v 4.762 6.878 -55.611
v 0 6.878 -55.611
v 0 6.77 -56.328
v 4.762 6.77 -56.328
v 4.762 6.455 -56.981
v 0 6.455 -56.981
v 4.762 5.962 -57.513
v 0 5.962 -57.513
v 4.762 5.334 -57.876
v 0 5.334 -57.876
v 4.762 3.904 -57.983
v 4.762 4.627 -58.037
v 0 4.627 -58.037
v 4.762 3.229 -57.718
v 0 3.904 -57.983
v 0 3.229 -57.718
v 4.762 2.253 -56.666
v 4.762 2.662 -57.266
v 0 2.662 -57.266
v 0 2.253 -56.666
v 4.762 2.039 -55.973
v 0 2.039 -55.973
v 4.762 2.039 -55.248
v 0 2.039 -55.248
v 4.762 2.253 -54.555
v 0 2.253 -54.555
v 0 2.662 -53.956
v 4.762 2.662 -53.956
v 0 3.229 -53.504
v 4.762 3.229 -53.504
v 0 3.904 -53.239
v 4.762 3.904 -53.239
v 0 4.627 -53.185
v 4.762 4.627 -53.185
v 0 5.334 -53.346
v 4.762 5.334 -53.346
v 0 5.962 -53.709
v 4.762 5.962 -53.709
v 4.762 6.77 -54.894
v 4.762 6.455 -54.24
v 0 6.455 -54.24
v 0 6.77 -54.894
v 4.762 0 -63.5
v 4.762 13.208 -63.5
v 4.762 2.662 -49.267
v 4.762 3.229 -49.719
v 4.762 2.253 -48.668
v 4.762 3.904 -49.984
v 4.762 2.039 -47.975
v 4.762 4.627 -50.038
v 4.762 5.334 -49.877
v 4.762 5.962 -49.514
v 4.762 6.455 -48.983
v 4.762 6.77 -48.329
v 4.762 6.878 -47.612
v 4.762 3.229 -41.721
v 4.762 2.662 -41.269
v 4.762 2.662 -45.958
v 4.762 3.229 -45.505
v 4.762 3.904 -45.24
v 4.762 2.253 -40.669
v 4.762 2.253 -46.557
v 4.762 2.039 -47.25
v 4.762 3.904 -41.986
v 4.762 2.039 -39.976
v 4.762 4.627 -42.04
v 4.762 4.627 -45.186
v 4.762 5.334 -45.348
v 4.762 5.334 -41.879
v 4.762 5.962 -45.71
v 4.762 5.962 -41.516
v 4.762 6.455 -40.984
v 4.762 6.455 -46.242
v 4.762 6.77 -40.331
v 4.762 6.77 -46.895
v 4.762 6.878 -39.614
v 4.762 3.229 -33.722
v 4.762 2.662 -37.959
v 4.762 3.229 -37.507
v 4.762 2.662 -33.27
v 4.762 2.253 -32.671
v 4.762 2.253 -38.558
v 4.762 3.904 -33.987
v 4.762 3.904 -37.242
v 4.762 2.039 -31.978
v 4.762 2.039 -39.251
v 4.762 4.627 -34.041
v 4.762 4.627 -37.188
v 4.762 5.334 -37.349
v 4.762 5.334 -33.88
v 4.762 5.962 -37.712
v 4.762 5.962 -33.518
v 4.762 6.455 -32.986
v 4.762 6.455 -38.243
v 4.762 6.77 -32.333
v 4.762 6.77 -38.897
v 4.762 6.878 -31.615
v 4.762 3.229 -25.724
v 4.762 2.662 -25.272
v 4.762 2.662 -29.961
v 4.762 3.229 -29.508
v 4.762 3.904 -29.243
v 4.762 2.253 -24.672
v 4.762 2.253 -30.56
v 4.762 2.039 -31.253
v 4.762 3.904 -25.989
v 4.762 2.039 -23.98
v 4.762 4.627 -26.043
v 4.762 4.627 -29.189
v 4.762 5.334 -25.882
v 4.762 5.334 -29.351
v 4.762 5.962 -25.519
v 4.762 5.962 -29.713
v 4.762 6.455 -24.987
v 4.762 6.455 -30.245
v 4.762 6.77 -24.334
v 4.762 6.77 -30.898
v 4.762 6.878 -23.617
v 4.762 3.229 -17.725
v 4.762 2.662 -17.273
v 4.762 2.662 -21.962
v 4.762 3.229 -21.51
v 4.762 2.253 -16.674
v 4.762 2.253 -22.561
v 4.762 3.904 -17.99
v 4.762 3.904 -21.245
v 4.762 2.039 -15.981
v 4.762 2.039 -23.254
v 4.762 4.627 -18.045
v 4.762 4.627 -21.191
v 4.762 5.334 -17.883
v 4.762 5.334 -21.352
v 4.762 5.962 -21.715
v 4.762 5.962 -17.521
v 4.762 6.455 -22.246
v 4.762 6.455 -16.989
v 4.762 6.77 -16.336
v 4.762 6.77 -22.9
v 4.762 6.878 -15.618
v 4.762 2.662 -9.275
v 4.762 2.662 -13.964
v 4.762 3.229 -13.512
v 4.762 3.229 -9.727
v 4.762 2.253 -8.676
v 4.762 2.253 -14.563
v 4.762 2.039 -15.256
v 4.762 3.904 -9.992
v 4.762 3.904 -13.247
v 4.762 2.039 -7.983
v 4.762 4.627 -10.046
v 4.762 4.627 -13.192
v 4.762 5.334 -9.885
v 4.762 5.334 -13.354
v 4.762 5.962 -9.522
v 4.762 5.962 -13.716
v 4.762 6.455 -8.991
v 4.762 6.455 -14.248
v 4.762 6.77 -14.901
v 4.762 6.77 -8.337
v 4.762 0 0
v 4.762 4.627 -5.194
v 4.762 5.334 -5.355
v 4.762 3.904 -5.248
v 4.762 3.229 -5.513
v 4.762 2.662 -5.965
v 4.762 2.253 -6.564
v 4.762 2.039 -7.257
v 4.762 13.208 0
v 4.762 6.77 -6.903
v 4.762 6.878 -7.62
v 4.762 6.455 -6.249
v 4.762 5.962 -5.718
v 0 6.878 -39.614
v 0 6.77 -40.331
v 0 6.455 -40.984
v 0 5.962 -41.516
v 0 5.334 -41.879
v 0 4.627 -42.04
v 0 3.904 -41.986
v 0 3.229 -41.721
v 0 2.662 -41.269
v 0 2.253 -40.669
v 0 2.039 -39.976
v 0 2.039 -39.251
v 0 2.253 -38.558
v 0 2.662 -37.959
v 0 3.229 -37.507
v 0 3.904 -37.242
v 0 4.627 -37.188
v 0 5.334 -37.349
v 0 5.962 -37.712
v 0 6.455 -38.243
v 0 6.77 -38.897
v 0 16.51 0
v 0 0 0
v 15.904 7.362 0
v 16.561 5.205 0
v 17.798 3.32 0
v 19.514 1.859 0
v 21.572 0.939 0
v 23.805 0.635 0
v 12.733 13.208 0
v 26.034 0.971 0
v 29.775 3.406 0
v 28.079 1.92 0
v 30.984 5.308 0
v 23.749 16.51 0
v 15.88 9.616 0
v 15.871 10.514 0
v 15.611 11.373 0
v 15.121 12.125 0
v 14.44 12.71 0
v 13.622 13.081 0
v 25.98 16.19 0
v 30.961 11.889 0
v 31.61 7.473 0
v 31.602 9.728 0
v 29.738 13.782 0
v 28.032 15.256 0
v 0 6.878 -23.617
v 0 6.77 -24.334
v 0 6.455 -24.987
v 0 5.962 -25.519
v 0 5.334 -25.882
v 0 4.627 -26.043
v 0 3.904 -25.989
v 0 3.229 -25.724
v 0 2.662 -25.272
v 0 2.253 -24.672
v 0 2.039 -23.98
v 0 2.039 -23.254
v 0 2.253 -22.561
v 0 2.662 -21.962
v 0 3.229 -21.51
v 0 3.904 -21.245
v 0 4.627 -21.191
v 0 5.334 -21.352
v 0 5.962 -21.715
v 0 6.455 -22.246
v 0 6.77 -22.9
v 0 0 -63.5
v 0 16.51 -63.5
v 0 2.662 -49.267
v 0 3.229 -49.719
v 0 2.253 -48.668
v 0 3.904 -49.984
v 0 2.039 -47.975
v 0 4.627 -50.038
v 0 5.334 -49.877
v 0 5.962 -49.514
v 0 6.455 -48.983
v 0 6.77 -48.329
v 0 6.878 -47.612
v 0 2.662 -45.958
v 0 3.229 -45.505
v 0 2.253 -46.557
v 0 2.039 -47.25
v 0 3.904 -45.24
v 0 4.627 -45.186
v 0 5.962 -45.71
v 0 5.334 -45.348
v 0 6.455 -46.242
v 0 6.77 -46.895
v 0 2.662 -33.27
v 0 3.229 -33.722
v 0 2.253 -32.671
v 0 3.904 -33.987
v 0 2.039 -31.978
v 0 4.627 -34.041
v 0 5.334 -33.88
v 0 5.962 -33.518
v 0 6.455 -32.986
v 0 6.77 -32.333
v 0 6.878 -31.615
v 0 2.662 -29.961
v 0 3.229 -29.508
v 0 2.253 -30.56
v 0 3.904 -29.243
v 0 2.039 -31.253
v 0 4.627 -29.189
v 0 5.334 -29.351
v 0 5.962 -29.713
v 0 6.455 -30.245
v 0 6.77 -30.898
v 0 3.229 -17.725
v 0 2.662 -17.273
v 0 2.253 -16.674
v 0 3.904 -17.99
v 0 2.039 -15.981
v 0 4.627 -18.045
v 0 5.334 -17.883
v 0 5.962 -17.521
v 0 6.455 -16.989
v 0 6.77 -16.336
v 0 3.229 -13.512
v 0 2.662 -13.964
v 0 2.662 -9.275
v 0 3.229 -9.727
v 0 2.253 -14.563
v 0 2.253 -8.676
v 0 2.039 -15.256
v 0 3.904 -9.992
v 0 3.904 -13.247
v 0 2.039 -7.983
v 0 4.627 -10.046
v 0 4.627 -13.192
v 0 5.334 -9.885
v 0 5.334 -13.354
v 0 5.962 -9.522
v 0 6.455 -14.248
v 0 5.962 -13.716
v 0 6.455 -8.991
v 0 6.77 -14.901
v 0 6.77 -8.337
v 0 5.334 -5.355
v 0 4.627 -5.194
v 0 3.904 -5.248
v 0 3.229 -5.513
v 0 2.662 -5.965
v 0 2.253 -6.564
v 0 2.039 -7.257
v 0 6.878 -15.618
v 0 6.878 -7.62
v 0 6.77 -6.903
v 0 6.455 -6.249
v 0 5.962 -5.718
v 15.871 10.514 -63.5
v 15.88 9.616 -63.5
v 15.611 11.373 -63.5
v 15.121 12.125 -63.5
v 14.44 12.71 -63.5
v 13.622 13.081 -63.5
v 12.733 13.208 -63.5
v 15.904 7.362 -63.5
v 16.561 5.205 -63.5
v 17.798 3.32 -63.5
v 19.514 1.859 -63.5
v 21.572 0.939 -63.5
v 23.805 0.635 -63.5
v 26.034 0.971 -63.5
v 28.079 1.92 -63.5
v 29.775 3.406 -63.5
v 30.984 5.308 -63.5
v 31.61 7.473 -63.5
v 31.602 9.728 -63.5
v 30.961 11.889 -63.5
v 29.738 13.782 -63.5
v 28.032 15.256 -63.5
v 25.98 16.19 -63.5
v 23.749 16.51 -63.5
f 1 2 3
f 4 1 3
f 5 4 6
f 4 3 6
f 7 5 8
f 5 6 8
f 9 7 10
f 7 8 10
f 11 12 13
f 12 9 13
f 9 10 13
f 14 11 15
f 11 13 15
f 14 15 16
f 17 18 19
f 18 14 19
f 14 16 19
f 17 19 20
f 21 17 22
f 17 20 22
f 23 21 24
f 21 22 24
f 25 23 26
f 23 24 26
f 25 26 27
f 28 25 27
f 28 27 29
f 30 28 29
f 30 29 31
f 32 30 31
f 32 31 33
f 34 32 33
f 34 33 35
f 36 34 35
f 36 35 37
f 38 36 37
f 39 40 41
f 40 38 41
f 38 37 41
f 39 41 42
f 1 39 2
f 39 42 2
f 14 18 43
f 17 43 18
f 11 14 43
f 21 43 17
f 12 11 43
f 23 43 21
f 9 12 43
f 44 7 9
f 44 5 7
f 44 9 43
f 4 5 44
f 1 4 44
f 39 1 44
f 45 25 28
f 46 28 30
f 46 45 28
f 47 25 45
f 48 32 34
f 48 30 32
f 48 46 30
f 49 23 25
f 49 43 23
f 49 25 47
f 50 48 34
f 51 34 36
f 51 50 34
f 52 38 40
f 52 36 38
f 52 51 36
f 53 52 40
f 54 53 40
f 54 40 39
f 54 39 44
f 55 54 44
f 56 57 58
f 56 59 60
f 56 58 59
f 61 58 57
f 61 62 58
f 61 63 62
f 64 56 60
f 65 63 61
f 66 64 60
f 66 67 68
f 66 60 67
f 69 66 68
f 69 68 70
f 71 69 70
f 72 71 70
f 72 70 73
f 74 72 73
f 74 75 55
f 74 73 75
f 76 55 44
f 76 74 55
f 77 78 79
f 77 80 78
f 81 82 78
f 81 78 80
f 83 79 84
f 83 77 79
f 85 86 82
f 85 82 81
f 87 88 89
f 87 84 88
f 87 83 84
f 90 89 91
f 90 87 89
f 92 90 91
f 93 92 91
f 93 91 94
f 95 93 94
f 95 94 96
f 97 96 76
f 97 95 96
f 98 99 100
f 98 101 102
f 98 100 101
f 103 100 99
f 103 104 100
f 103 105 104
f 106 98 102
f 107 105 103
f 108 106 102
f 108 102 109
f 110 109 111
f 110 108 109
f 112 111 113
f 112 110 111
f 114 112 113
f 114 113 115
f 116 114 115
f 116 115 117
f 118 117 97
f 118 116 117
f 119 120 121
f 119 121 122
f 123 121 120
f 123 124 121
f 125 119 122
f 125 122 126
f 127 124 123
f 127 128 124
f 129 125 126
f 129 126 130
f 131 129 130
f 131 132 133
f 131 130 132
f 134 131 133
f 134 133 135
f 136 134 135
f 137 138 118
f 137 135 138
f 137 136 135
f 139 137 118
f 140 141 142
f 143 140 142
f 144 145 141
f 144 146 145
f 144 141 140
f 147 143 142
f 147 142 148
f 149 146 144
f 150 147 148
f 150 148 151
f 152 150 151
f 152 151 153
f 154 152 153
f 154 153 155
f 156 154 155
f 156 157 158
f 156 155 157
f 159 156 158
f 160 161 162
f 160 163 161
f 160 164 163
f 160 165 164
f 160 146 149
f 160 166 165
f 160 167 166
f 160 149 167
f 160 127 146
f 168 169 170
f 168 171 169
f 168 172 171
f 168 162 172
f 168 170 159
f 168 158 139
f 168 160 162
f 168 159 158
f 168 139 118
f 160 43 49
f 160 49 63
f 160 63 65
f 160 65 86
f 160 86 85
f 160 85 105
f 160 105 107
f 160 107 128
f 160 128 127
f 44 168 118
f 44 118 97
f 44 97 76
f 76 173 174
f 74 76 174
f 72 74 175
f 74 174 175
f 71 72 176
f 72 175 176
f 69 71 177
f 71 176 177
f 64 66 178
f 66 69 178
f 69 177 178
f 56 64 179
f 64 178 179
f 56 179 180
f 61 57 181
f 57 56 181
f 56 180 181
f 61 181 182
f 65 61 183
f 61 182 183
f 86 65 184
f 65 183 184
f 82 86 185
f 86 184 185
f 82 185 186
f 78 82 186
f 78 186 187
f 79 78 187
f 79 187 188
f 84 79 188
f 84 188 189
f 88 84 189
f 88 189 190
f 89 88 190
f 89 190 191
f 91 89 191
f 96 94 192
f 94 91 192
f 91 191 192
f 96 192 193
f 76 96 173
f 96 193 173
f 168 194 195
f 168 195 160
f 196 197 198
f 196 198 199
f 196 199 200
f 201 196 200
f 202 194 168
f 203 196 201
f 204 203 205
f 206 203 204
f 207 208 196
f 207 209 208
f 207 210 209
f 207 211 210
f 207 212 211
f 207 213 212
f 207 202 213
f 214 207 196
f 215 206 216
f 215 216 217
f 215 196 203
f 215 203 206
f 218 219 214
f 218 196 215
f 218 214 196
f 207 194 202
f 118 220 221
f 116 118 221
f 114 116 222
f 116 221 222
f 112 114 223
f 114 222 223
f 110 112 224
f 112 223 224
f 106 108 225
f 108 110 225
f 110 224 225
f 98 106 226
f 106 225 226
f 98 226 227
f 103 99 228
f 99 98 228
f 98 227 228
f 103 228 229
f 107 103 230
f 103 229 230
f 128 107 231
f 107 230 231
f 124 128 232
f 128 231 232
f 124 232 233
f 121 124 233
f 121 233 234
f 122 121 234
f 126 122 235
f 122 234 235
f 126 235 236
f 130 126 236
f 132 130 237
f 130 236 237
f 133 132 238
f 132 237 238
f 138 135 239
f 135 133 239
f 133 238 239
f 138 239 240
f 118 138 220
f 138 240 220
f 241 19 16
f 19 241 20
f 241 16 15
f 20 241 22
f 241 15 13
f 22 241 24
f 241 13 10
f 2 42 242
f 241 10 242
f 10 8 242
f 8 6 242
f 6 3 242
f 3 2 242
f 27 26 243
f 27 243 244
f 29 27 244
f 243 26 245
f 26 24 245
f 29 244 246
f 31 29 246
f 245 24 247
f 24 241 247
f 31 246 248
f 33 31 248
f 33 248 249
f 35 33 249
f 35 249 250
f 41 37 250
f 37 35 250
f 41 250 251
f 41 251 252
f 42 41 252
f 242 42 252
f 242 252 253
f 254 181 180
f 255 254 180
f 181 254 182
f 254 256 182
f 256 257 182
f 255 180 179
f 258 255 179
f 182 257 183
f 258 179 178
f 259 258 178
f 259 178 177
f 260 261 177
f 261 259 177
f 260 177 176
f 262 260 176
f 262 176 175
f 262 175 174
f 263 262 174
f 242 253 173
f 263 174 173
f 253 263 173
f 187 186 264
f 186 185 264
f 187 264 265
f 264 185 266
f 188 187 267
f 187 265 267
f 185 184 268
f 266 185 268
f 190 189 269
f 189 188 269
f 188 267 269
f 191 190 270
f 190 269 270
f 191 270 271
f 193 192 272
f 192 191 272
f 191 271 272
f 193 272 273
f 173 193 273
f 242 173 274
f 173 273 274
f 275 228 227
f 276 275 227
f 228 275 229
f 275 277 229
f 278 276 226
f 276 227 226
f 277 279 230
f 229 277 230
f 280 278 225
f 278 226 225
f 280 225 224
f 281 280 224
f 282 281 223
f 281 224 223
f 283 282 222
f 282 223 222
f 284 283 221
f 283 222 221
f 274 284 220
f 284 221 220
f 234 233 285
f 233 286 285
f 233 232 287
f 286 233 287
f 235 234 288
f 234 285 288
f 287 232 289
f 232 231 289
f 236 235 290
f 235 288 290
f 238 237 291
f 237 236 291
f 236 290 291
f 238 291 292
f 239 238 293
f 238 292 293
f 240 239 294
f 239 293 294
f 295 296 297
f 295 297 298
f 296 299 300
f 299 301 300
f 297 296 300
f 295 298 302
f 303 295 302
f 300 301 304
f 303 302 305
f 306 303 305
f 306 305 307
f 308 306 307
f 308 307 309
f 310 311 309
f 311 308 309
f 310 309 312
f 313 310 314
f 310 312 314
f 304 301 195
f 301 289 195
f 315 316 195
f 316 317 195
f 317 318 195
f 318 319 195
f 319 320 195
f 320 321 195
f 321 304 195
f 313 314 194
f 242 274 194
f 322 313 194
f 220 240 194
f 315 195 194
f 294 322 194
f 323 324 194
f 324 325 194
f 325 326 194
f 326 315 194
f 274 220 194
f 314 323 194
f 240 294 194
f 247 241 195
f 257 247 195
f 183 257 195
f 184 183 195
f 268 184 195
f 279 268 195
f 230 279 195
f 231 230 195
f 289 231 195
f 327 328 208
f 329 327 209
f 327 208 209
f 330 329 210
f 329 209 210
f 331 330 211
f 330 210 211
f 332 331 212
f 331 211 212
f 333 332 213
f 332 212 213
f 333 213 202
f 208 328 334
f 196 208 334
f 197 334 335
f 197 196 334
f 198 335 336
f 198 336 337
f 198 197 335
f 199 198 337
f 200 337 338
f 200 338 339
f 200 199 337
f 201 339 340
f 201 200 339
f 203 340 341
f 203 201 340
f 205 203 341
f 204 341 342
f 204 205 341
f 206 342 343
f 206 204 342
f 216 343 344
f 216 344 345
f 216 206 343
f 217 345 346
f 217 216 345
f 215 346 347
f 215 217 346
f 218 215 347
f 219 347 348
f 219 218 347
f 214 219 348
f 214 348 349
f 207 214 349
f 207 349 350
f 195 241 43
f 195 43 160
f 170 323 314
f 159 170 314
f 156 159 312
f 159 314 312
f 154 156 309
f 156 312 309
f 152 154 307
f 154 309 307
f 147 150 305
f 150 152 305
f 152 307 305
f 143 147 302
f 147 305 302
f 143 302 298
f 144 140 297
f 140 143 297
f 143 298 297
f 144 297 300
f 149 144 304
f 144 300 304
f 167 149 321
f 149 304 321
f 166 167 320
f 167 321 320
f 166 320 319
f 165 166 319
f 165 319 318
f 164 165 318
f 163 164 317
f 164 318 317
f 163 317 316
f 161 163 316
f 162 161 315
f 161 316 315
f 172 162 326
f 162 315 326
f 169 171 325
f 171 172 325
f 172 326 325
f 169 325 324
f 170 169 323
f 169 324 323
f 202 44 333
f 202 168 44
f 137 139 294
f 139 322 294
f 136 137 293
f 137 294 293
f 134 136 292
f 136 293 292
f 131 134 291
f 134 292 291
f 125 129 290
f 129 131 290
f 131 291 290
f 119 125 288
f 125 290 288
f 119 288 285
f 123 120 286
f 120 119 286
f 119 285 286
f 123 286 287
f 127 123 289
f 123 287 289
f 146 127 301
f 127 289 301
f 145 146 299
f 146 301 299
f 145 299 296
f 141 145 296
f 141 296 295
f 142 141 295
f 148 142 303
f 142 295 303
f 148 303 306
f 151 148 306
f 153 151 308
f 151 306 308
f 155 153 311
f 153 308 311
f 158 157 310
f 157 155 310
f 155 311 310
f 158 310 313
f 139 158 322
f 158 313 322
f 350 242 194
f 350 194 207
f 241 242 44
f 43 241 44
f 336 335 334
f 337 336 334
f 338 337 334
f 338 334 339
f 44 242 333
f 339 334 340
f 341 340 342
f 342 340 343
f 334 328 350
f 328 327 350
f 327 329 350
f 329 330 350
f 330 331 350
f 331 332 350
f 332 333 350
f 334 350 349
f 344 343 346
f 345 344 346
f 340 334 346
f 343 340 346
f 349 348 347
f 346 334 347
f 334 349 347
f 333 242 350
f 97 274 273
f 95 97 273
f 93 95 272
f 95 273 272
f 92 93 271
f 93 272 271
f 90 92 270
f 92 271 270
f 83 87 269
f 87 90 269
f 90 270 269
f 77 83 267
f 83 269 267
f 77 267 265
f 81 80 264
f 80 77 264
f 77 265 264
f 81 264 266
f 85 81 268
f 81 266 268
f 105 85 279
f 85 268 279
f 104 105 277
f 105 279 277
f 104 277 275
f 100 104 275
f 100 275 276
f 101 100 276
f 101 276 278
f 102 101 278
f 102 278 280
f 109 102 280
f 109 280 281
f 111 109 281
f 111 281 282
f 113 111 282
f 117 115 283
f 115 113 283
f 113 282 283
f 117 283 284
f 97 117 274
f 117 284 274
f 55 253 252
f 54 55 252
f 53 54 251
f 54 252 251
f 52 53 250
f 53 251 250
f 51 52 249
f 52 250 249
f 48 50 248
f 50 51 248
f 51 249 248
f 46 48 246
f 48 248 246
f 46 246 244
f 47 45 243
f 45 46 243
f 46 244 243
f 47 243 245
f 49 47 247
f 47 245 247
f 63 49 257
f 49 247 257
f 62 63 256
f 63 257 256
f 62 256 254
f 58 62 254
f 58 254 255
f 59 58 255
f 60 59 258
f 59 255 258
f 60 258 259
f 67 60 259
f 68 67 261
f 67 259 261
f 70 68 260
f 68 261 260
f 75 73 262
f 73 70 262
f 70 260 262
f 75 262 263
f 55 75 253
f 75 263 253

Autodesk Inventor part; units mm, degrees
ref_plane "YZ Plane" through (0, 0, 0) normal (1, 0, 0) x (0, 1, 0)
ref_plane "XZ Plane" through (0, 0, 0) normal (0, 1, 0) x (-1, 0, 0)
ref_plane "XY Plane" through (0, 0, 0) normal (0, 0, 1) x (1, 0, 0)
sketch "Sketch1" plane through (0, 0, 0) normal (1, 0, 0) x (0, 1, 0)
  line L0 (0, 0) -> (16.51, 0)
  line L1 (16.51, 0) -> (16.51, -63.5)
  line L2 (16.51, -63.5) -> (0, -63.5)
  line L3 (0, -63.5) -> (0, 0)
  circle A0 centre (4.445, -7.62) radius 2.4329
  circle A1 centre (4.445, -15.6185) radius 2.4329
  circle A2 centre (4.445, -23.6169) radius 2.4329
  circle A3 centre (4.445, -31.6154) radius 2.4329
  circle A4 centre (4.445, -39.6138) radius 2.4329
  circle A5 centre (4.445, -47.6123) radius 2.4329
  circle A6 centre (4.445, -55.6108) radius 2.4329
  dimension "d0" = 63.5
  dimension "d1" = 16.51
  dimension "d6" = 7.9985
  dimension "d11" = 7.62
extrude "Extrusion1" add sketch "Sketch1" along normal blind 4.7625
sketch "Sketch2" plane through (4.7625, 0, 0) normal (1, 0, 0) x (0, 0, -1)
  line L0 (63.5, 16.51) -> (0, 16.51) projected
  line L1 (63.5, 0) -> (63.5, 16.51) projected
  line L2 (0, 16.51) -> (63.5, 16.51)
  line L3 (63.5, 16.51) -> (63.5, 13.208)
  line L4 (63.5, 13.208) -> (0, 13.208)
  line L5 (0, 13.208) -> (0, 16.51)
  point P0 (0, 0)
  dimension "d14" = 3.302
extrude "Extrusion2" add sketch "Sketch2" along normal blind 1.016
sketch "Sketch3" plane through (0, 0, 0) normal (0, 0, 1) x (1, 0, 0)
  line L0 (5.7785, 16.51) -> (5.7785, 13.208) projected
  arc A0 (15.8804, 9.6157) -> (23.749, 16.51) centre (23.749, 8.5725) ccw
  line L1 (0, 16.51) -> (0, 0) projected
  line L2 (5.7785, 16.51) -> (23.749, 16.51)
  line L3 (4.7625, 13.208) -> (5.7785, 13.208) projected
  line L4 (5.7785, 13.208) -> (12.7329, 13.208)
  arc A1 (15.8804, 9.6157) -> (12.7329, 13.208) centre (12.7329, 10.033) ccw
  point P0 (17.3057, 13.208)
  point P1 (9.5258, 13.208)
  dimension "d17" = 23.749
  dimension "d18" = 15.875
  dimension "d19" = 3.175
extrude "Extrusion3" add sketch "Sketch3" against normal blind 63.5
sketch "Sketch4" plane through (0, 16.51, 0) normal (0, 1, 0) x (1, 0, 0)
  line L0 (31.6865, 0) -> (31.6865, 63.5) projected
  line L1 (31.6865, 0) -> (31.6865, 83.2403)
  point P0 (0, 0)
properties part number "knuckle plate"
